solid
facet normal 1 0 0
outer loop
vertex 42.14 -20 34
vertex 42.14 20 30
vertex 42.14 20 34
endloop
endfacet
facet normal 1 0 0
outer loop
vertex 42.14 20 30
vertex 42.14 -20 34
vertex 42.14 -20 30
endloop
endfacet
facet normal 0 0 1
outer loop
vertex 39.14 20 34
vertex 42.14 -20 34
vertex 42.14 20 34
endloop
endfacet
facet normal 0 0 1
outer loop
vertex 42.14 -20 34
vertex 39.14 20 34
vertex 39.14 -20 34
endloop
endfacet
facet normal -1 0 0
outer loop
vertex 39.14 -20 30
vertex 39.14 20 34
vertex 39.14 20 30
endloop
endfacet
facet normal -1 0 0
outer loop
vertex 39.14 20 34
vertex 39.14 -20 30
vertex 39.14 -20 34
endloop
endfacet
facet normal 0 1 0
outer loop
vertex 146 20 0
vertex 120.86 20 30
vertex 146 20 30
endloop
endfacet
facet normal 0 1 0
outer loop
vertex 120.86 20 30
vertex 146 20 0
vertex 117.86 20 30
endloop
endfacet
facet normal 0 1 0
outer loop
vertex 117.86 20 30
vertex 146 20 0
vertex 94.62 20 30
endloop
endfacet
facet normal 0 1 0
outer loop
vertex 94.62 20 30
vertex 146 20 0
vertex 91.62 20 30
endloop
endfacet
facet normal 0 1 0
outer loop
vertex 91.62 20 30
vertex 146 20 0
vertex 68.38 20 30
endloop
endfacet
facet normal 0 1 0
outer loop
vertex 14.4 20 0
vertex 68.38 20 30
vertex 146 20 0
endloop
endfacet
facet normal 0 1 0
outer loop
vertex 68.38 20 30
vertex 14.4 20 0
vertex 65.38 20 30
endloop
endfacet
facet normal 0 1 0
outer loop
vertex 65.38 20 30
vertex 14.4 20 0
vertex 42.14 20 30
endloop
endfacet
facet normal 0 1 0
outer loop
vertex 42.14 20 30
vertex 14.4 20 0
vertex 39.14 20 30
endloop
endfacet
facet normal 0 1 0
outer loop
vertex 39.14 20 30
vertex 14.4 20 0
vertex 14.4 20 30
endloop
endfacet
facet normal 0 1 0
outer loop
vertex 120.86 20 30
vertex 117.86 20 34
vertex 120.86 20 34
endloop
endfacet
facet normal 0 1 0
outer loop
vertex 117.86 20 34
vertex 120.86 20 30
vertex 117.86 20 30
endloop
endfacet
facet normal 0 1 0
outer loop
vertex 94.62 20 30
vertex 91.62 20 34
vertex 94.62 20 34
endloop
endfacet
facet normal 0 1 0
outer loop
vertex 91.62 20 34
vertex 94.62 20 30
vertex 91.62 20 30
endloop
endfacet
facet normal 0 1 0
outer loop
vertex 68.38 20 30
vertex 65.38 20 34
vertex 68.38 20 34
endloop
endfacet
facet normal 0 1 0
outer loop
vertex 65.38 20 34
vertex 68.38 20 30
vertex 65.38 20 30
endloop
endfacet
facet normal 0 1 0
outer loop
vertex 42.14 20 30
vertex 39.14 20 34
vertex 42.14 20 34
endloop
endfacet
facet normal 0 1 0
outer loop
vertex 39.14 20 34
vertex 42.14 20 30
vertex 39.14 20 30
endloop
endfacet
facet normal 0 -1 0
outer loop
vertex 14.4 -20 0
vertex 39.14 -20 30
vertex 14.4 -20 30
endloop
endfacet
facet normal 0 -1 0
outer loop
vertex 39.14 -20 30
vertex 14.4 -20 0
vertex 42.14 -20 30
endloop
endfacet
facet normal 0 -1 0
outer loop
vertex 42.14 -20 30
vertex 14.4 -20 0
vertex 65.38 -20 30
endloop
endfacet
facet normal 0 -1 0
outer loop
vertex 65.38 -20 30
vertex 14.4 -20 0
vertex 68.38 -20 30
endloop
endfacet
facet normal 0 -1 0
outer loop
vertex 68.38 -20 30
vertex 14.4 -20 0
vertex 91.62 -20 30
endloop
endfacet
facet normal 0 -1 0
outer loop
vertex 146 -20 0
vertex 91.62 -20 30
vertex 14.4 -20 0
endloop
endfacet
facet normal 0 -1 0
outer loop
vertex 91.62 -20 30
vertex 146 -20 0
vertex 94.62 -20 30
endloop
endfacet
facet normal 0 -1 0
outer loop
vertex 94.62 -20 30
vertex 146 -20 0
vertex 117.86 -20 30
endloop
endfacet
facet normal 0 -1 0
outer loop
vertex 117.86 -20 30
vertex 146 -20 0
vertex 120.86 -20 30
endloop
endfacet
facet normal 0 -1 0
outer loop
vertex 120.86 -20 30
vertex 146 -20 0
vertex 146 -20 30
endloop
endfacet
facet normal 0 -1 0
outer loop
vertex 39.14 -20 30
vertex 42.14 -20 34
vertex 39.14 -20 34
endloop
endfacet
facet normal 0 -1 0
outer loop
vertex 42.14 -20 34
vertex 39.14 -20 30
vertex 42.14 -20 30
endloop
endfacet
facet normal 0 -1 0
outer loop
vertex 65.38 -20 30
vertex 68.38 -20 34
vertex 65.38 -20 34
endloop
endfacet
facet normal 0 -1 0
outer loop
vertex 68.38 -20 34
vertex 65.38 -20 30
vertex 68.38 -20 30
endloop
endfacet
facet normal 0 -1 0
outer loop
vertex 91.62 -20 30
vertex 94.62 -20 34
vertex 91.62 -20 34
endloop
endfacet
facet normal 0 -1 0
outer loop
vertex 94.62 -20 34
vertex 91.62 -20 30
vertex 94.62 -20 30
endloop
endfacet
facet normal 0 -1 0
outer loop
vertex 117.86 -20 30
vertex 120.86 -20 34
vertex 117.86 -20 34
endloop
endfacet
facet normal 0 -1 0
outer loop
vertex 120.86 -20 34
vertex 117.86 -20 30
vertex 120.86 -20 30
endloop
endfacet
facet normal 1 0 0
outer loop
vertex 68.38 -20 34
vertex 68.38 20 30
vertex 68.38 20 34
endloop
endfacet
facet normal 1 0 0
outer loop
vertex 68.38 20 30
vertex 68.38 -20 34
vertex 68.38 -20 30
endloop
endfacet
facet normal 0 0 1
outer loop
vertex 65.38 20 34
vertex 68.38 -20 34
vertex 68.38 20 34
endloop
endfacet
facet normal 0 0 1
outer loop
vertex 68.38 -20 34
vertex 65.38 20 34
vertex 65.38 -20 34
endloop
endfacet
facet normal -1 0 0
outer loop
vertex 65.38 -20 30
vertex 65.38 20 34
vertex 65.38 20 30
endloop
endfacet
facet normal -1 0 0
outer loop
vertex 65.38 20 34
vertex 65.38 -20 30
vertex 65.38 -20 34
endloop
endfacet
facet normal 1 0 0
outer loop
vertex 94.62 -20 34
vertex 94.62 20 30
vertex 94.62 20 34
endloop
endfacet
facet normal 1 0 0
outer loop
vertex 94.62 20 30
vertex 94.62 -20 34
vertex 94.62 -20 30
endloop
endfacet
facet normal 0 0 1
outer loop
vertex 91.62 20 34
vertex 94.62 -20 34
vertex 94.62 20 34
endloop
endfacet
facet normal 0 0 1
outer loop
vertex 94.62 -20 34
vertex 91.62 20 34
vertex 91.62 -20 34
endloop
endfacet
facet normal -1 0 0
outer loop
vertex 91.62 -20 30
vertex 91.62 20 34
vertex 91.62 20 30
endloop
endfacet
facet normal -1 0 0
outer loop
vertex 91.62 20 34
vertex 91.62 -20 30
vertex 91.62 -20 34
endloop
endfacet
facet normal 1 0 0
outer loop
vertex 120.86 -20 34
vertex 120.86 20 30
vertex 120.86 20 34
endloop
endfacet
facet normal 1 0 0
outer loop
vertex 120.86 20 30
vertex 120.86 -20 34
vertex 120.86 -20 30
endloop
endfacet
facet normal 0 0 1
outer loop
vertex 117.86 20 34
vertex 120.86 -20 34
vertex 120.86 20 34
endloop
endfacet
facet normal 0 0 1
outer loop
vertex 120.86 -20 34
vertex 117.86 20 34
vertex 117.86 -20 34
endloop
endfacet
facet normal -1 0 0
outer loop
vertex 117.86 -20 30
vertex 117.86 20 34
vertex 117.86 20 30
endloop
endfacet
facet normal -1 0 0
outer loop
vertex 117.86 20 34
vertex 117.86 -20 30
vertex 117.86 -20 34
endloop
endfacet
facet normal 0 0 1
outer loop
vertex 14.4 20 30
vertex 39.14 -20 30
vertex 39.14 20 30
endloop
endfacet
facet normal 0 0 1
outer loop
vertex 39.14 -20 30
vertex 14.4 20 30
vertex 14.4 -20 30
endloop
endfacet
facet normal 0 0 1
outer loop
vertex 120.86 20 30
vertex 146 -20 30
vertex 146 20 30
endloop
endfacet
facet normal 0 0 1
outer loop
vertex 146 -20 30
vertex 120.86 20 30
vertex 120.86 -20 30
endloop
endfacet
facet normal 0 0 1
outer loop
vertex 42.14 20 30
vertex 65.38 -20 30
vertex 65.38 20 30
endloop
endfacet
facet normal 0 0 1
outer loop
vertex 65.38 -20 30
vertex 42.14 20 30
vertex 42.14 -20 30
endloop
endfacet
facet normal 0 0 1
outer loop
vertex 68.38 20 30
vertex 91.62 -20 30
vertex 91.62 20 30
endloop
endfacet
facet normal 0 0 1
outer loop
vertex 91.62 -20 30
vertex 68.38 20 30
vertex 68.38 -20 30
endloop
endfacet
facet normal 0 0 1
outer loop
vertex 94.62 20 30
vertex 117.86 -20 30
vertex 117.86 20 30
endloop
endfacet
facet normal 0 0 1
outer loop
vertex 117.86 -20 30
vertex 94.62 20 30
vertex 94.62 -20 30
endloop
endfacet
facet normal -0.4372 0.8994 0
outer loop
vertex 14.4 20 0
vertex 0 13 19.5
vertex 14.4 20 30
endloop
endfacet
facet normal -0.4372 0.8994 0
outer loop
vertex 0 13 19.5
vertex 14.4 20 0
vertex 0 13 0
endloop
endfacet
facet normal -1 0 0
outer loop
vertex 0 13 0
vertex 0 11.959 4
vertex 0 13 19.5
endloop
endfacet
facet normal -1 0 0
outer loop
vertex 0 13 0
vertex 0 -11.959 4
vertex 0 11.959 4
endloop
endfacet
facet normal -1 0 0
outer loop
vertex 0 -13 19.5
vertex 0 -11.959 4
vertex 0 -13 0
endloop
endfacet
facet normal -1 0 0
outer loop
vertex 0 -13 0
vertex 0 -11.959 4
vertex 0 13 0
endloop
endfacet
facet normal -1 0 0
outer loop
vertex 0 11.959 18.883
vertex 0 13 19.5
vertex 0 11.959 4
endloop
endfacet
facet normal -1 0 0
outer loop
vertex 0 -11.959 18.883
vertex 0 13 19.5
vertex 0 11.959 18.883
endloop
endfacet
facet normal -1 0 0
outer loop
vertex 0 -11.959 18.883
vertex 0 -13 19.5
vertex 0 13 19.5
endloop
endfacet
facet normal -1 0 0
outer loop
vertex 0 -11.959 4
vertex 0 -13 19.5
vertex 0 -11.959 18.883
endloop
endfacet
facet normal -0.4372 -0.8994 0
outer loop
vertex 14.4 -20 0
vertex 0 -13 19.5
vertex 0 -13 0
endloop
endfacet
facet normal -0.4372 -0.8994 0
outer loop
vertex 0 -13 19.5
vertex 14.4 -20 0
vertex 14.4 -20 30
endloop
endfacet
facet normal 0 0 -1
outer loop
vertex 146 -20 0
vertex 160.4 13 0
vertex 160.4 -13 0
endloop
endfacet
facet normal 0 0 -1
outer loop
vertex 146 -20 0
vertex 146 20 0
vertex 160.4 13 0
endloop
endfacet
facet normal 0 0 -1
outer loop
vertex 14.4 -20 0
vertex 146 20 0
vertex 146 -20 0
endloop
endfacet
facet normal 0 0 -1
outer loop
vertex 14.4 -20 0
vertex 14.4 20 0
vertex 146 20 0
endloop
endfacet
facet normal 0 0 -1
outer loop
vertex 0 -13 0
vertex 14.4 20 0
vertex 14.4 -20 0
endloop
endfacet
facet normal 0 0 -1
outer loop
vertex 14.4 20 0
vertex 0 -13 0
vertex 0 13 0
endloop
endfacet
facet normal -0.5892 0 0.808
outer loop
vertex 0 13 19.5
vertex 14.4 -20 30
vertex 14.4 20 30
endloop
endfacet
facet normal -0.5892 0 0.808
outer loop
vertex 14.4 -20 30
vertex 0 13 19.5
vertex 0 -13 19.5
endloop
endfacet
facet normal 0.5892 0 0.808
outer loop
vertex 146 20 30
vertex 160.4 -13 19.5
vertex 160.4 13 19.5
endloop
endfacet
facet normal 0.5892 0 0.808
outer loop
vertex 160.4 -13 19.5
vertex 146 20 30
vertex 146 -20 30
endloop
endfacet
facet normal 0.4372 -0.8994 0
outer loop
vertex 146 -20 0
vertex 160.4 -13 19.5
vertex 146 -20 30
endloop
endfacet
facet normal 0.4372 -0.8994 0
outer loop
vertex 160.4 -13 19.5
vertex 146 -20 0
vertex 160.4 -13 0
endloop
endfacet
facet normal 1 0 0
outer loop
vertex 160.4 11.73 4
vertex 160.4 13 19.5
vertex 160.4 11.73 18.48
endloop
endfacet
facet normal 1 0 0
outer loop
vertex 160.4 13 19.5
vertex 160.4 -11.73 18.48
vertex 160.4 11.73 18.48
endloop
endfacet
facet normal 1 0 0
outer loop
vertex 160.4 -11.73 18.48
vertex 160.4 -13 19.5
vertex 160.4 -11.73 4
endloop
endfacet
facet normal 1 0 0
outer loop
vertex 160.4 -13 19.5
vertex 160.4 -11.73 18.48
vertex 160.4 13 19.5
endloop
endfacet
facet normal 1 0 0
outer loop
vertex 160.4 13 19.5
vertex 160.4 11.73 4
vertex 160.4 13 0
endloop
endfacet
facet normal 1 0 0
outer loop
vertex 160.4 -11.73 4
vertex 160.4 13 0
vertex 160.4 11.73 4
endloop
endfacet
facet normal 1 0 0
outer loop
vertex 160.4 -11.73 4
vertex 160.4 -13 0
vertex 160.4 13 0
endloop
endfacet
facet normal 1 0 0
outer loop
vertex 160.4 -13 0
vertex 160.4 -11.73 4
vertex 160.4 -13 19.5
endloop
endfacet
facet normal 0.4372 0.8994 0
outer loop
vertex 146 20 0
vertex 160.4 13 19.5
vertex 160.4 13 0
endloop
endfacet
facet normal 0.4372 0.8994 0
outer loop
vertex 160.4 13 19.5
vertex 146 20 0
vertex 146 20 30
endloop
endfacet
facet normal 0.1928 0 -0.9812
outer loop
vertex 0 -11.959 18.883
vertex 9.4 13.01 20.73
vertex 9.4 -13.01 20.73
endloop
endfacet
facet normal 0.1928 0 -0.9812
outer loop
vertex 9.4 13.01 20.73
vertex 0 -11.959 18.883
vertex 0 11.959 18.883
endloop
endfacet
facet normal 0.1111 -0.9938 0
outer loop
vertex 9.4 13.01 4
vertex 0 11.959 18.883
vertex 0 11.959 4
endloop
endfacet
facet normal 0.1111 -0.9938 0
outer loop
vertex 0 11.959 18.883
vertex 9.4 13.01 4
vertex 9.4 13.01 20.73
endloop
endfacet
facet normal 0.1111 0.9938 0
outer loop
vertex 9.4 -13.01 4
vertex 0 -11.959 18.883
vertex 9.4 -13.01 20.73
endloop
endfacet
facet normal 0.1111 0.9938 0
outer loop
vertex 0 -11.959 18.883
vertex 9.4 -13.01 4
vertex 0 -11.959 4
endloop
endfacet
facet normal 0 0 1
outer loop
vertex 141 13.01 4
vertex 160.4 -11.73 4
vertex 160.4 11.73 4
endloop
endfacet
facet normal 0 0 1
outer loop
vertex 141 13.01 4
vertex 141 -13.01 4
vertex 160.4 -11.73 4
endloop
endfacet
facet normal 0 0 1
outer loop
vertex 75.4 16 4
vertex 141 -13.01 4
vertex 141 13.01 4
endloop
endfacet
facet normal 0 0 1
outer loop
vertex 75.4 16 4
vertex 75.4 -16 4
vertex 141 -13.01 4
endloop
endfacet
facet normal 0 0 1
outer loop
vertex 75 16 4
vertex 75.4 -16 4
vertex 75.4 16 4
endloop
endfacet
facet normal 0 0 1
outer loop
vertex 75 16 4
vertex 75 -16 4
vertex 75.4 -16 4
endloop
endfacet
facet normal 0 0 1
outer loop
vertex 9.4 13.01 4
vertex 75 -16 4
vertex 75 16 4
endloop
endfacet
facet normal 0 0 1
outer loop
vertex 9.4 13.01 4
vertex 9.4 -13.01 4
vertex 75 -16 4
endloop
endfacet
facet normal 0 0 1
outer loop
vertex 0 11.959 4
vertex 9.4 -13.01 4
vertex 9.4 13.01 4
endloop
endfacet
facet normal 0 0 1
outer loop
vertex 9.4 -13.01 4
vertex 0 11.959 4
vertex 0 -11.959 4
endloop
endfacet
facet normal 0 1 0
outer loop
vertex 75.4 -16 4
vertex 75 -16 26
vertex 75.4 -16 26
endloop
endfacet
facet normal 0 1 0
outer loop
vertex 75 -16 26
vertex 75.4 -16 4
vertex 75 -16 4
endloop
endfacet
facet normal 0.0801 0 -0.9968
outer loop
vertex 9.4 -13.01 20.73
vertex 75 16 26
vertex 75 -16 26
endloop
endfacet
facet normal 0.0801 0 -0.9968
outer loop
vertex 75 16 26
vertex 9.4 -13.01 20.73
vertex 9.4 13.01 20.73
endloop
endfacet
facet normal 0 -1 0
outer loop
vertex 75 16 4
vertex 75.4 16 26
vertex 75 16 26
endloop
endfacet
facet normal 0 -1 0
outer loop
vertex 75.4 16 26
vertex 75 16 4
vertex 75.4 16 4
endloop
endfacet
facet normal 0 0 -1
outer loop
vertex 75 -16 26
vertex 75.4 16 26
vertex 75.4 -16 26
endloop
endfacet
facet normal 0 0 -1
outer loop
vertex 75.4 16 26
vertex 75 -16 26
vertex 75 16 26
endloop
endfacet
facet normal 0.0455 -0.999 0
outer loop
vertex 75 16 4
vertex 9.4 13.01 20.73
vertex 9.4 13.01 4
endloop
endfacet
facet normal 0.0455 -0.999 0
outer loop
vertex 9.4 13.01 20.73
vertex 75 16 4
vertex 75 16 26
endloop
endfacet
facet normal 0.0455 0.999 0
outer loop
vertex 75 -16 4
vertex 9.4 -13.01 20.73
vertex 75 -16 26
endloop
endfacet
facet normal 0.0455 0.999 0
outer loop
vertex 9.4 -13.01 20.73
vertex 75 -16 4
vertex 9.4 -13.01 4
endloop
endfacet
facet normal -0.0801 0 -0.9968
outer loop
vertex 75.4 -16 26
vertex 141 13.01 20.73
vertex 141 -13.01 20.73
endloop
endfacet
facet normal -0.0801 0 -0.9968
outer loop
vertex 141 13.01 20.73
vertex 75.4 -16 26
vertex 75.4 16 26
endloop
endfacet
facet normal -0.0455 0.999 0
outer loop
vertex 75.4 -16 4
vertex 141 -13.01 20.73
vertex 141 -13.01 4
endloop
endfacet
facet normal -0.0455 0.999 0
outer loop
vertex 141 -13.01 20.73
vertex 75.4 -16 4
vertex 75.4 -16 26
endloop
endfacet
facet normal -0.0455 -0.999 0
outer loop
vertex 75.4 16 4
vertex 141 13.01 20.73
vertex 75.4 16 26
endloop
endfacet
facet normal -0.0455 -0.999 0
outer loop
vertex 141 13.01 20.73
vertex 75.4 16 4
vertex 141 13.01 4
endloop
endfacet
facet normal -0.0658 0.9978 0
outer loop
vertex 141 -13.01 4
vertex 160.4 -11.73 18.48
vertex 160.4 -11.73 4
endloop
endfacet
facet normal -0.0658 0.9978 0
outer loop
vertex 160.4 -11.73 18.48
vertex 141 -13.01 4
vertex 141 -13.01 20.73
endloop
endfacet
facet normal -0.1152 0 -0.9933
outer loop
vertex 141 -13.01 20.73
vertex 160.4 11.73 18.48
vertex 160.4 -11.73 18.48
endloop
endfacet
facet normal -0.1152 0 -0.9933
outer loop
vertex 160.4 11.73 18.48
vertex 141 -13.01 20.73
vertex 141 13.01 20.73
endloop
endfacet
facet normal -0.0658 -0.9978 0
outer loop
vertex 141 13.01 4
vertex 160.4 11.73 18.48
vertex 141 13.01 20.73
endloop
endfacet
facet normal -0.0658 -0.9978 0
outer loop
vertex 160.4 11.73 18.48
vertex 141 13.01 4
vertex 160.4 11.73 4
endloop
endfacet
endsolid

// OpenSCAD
$fn = 32;

// ----------------------------------------------------------------------
// Faired channel: 160 x 40 x 30 mm, 4 mm walls, faired ends
// ----------------------------------------------------------------------

// --- parameters (mm) ---
length = 160;             // channel length
width = 40;               // channel width at mid length
height = 30;              // channel height at mid length
wall = 4;                 // side wall thickness
floor_t = 4;              // floor thickness
end_w = 26;               // faired end width
end_h = 19.5;             // faired end height
ribs = 4;                 // stiffening ribs on the top
rib_t = 3;                // rib thickness
rib_h = 4;                // rib height

difference() {
  union() {
    hull() {
      translate([0, -13, 0]) cube([0.4, 26, 19.5]);
      translate([14.4, -20, 0]) cube([0.4, 40, 30]);
    }
    hull() {
      translate([14.4, -20, 0]) cube([0.4, 40, 30]);
      translate([80, -20, 0]) cube([0.4, 40, 30]);
    }
    hull() {
      translate([80, -20, 0]) cube([0.4, 40, 30]);
      translate([145.6, -20, 0]) cube([0.4, 40, 30]);
    }
    hull() {
      translate([145.6, -20, 0]) cube([0.4, 40, 30]);
      translate([160, -13, 0]) cube([0.4, 26, 19.5]);
    }
    /* stiffening ribs across the flat top, sunk 0.8 mm into it */
    for (i = [1 : ribs]) {
      translate([14.4 + i * (length - 2 * 14.4) / (ribs + 1) - rib_t / 2, -width / 2, height - 0.8]) cube([rib_t, width, rib_h + 0.8]);
    }
  }
  /* cavity, 5 mm proud of both ends so the ports are cut clean */
  hull() {
    translate([-5, -11.4, 4]) cube([0.4, 22.8, 13.9]);
    translate([9.4, -13.01, 4]) cube([0.4, 26.02, 16.73]);
  }
  hull() {
    translate([9.4, -13.01, 4]) cube([0.4, 26.02, 16.73]);
    translate([75, -16, 4]) cube([0.4, 32, 22]);
  }
  hull() {
    translate([75, -16, 4]) cube([0.4, 32, 22]);
    translate([140.6, -13.01, 4]) cube([0.4, 26.02, 16.73]);
  }
  hull() {
    translate([140.6, -13.01, 4]) cube([0.4, 26.02, 16.73]);
    translate([165, -11.4, 4]) cube([0.4, 22.8, 13.9]);
  }
}
